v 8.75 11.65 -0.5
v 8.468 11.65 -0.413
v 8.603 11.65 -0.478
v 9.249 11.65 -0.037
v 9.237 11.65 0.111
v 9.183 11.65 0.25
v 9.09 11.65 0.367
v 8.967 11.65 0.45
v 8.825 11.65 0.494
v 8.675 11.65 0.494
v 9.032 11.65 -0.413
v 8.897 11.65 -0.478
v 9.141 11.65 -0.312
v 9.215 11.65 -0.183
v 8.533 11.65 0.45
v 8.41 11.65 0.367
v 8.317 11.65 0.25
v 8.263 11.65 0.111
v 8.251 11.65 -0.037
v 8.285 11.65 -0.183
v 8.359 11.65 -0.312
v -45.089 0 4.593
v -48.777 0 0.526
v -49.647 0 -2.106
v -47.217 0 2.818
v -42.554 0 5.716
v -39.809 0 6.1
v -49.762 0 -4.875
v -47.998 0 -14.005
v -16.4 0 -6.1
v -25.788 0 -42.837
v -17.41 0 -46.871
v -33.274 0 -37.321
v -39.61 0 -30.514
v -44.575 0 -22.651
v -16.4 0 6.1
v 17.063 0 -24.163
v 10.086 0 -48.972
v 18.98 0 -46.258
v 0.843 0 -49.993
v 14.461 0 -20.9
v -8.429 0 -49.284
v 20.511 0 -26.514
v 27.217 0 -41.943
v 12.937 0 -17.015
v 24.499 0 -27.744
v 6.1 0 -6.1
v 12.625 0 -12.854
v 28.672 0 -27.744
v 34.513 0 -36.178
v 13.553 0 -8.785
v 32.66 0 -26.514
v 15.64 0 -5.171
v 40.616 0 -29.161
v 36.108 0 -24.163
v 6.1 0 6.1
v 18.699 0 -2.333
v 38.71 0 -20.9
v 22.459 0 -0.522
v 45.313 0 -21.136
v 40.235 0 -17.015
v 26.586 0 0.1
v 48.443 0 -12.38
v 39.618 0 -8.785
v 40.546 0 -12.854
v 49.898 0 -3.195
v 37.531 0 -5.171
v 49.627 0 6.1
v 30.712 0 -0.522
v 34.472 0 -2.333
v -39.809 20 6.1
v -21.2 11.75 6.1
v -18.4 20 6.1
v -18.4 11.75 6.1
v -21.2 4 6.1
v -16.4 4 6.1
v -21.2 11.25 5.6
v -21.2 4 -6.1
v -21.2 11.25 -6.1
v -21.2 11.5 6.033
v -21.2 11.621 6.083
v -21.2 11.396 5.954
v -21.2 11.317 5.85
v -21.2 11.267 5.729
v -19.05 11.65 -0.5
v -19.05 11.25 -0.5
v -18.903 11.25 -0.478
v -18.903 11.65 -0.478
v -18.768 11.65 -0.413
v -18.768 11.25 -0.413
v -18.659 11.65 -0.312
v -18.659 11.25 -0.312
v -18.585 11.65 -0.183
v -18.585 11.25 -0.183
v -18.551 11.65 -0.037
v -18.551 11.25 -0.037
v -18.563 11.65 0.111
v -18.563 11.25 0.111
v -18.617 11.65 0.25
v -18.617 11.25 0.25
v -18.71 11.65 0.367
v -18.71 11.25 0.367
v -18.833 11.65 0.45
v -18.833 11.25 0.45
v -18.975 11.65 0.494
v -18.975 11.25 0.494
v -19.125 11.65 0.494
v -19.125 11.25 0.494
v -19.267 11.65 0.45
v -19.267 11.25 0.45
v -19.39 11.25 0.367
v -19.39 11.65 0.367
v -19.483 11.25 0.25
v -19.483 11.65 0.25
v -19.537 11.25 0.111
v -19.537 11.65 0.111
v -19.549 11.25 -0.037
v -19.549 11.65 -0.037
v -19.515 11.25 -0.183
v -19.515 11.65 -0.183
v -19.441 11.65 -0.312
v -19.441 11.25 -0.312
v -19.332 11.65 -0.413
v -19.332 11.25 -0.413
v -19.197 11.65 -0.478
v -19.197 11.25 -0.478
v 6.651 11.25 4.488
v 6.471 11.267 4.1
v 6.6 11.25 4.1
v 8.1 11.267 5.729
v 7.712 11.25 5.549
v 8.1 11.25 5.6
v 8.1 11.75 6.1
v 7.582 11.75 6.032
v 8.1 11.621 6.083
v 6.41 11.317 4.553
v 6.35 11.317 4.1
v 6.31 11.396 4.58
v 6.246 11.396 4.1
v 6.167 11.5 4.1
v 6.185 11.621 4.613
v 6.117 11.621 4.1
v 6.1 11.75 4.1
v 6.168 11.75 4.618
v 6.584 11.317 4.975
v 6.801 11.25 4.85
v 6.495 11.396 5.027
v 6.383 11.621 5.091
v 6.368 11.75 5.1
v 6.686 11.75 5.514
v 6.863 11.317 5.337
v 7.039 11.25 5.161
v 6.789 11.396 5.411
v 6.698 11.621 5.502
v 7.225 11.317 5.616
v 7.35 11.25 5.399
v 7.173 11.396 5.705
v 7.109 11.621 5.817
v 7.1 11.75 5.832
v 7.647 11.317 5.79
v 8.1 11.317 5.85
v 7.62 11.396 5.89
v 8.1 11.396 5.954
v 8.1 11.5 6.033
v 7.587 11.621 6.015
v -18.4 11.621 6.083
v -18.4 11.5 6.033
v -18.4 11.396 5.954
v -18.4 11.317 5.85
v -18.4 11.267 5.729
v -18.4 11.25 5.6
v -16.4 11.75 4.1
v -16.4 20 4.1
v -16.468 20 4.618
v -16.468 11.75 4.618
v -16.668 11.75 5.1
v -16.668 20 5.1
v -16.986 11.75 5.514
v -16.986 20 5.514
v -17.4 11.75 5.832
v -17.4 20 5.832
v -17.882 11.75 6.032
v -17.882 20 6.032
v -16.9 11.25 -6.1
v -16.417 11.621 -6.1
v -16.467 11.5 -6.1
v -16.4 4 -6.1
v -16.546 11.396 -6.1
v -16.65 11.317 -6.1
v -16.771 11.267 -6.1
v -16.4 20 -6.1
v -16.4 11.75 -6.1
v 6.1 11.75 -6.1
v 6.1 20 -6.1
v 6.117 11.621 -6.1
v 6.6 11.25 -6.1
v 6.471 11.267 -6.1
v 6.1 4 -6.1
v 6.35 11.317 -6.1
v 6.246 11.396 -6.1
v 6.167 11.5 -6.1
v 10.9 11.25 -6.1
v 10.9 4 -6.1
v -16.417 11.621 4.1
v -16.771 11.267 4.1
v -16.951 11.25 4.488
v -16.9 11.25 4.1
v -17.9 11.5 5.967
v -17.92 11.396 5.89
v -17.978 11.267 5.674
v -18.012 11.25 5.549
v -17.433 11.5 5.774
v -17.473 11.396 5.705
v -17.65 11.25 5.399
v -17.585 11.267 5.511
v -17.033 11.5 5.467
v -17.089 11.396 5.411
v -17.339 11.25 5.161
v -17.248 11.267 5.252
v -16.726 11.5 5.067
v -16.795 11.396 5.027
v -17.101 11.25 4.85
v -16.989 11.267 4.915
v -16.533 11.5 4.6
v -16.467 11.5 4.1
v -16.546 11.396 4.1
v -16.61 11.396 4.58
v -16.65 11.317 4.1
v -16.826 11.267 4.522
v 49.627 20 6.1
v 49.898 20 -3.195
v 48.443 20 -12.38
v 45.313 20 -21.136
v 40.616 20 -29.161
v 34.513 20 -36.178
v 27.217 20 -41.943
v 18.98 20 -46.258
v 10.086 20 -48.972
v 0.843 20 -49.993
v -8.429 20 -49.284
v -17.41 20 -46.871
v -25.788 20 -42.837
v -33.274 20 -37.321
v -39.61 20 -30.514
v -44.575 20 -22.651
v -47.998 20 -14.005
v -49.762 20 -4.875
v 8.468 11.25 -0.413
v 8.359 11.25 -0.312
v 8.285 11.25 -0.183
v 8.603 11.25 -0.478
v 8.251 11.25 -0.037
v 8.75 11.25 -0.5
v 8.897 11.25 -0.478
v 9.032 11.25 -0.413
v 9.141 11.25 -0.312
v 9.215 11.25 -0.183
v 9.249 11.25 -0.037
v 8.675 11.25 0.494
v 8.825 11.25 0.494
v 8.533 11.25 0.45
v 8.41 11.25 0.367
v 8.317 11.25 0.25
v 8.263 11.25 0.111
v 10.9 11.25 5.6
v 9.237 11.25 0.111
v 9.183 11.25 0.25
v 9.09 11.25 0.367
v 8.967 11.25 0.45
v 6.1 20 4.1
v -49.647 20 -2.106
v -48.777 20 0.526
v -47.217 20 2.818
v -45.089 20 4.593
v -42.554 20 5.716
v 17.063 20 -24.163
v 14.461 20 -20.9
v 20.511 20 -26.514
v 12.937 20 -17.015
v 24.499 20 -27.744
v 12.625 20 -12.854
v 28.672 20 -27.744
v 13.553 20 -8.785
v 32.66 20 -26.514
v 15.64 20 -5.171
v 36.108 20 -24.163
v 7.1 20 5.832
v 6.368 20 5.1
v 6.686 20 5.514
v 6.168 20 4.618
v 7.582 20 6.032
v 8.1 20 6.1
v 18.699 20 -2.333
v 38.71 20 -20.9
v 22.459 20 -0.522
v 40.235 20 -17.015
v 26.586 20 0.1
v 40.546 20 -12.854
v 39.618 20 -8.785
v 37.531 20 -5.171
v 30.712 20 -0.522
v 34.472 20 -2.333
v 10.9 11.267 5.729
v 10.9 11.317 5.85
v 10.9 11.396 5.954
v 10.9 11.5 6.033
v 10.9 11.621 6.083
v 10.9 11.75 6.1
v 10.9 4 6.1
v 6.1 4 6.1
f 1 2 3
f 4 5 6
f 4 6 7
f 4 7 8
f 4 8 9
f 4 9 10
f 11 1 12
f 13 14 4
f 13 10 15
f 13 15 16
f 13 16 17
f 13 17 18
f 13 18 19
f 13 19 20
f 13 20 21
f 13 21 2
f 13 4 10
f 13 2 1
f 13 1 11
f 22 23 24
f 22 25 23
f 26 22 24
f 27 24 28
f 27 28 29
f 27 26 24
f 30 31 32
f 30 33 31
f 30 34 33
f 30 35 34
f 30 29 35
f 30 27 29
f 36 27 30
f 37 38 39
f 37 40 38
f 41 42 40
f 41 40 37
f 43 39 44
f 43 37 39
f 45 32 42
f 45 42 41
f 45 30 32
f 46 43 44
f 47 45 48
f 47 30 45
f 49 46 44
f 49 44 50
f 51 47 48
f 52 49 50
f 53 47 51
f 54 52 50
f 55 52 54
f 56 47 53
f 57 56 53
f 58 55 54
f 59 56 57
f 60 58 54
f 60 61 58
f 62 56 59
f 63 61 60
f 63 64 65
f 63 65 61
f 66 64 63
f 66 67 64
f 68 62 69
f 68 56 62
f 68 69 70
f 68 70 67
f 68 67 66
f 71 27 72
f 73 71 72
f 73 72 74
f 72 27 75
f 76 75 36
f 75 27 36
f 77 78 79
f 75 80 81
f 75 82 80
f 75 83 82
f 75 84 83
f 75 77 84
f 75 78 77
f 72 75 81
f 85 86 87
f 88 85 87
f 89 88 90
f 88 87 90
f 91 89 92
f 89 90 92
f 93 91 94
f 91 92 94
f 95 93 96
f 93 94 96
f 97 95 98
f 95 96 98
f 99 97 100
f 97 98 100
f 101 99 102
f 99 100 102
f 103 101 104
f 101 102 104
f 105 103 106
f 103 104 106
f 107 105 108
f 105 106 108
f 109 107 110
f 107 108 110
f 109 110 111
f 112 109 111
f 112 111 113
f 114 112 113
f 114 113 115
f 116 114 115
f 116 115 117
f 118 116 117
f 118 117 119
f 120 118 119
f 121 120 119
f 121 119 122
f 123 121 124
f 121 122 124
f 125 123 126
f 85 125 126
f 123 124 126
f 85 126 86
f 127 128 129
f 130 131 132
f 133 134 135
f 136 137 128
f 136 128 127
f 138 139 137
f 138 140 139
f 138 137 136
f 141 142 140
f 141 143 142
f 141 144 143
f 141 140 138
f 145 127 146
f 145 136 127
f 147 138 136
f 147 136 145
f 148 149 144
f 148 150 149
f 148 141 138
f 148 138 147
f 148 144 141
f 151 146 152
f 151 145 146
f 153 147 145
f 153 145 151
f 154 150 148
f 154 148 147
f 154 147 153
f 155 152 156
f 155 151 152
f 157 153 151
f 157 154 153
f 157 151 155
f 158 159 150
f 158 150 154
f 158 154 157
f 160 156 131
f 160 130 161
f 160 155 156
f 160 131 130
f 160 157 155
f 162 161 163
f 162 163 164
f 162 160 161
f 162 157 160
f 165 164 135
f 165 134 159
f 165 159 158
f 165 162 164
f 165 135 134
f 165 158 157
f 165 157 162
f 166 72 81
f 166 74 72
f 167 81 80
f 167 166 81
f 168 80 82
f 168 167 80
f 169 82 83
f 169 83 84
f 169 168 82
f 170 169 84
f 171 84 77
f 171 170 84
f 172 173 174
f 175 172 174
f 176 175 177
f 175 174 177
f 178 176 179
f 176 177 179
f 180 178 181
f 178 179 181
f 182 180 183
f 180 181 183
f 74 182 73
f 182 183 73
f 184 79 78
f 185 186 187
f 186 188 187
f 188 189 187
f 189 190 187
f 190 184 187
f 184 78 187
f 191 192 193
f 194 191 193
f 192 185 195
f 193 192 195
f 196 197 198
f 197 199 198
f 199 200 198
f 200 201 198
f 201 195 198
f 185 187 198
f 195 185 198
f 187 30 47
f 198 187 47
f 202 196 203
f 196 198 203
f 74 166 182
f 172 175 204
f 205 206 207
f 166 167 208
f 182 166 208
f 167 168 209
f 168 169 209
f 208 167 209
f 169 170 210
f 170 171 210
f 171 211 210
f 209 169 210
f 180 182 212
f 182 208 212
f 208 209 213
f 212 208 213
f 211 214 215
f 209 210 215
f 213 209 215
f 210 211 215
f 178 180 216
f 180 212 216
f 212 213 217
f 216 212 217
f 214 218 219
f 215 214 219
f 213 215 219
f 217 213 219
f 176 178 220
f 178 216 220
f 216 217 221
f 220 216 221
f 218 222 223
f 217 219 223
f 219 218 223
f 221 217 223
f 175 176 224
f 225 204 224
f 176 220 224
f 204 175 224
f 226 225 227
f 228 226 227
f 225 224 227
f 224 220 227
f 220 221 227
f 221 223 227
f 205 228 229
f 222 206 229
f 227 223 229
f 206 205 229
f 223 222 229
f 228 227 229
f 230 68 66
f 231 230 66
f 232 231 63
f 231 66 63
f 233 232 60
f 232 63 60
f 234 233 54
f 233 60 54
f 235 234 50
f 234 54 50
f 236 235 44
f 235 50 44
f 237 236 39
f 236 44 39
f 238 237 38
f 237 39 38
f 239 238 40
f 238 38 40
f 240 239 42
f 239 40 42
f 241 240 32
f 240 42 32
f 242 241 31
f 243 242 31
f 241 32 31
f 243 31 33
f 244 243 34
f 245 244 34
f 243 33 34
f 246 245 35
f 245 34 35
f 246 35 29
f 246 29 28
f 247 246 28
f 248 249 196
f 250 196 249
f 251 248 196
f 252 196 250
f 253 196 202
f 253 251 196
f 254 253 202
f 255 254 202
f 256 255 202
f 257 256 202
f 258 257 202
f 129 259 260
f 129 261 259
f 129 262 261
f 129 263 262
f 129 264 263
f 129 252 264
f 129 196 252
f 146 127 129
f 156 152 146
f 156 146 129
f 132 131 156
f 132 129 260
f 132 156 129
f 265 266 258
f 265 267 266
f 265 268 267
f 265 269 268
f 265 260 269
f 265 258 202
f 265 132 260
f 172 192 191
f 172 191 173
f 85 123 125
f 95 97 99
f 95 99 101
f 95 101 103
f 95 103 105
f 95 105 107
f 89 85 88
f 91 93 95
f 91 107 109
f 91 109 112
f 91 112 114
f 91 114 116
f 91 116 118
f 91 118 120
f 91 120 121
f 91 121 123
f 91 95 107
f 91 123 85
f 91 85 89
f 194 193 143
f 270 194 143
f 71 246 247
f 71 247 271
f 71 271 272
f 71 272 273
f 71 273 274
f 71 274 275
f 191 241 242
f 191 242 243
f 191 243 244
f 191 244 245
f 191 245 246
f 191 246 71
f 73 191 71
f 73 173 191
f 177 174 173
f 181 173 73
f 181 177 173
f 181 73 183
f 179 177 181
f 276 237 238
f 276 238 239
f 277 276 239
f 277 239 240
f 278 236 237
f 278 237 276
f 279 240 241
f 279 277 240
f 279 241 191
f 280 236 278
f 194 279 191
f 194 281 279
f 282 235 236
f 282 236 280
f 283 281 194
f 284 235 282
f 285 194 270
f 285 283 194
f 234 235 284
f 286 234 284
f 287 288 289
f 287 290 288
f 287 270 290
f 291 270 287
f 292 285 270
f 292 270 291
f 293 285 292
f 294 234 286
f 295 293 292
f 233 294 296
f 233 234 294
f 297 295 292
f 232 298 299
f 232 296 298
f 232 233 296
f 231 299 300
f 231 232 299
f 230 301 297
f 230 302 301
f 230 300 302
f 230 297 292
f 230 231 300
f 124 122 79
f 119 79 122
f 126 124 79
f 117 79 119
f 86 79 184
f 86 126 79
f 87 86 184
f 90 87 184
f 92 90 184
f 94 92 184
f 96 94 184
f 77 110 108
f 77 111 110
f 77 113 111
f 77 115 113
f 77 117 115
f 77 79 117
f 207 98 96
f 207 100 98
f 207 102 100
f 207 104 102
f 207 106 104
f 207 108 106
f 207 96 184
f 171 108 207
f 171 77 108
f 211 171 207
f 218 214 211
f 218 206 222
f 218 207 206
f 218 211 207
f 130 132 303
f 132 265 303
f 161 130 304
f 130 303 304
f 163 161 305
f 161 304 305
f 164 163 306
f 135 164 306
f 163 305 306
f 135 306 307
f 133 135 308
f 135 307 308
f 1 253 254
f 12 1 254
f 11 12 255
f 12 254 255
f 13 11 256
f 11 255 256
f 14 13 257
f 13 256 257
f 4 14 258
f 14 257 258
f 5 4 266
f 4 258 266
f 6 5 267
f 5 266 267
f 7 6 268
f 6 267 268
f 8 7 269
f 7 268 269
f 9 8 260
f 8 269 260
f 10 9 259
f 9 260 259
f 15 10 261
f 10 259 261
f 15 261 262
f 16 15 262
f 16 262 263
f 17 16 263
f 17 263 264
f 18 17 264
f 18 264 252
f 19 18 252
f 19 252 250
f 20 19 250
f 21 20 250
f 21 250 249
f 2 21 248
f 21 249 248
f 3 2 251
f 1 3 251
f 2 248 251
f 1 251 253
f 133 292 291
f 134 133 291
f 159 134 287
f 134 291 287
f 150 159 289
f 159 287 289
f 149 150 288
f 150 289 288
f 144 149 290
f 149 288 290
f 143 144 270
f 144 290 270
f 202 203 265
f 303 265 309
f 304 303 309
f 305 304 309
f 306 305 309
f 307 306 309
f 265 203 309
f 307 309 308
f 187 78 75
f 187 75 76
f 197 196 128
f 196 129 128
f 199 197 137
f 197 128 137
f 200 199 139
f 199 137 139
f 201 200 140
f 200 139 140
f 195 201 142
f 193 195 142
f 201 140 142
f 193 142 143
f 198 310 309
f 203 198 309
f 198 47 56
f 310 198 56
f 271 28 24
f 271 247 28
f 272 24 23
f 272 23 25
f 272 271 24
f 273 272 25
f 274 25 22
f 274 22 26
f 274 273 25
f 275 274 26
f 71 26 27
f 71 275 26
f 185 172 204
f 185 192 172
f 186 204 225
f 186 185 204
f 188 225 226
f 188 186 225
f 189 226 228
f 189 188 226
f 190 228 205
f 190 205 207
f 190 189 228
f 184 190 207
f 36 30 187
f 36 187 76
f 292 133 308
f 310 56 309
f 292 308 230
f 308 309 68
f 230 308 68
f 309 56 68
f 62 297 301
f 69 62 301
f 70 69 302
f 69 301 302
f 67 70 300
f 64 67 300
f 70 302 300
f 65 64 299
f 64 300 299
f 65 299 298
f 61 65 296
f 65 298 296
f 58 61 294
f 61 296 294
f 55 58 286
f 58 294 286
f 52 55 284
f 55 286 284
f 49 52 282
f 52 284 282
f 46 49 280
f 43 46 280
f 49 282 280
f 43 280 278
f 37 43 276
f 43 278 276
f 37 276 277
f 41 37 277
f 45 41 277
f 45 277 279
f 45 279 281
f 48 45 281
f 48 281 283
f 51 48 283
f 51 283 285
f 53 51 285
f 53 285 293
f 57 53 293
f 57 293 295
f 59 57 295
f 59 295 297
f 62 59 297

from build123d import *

# Parameters (mm, degrees)
SKETCH1_R           = 50
BOSS_EXTRUDE1_DEPTH = 20
CUT_EXTRUDE3_DEPTH  = 74.484692283
SKETCH14_W          = 22.5
SKETCH14_H          = 12.2
CUT_EXTRUDE4_DEPTH  = 74.484692283
SKETCH16_W          = 4.8
SKETCH16_H          = 12.2
CUT_EXTRUDE5_DEPTH  = 11.25
CUT_EXTRUDE7_START  = -11.25
SKETCH17_R          = 0.5
CUT_EXTRUDE7_DEPTH  = 0.4
CUT_EXTRUDE8_DEPTH  = 74.484692283
FILLET1_R           = 2
FILLET2_R           = 0.5
SKETCH4_R           = 14
CUT_EXTRUDE2_DEPTH  = 74.484692283
SKETCH20_W          = 4.8
SKETCH20_H          = 12.2
BOSS_EXTRUDE2_DEPTH = 4
FILLET3_R           = 10


with BuildPart() as part:
    # Sketch1 → Boss-Extrude1 (new body)
    with BuildSketch(Plane(origin=(0, 0, 0), x_dir=(1, 0, 0), z_dir=(0, 1, 0))):
        with Locations(Location((0, 0, 0), (0, 0, 270))):
            Circle(SKETCH1_R)
    extrude(amount=BOSS_EXTRUDE1_DEPTH)

    # Sketch15 → Cut-Extrude3 (cut, through all)
    with BuildSketch(Plane.XZ):
        with BuildLine():
            Line((-21.2, 6.1), (-21.2, 45.283109434))
            ThreePointArc((-21.2, 45.283109434), (-5.873377692, 49.65383605), (10.05, 48.979562064))
            Line((10.05, 48.979562064), (10.9, 6.1))
            Line((10.9, 6.1), (-21.2, 6.1))
        make_face()
    extrude(amount=-CUT_EXTRUDE3_DEPTH, mode=Mode.SUBTRACT)

    # Sketch14 → Cut-Extrude4 (cut, through all)
    with BuildSketch(Plane.XZ):
        with Locations((-5.15, 0)):
            Rectangle(SKETCH14_W, SKETCH14_H)
    extrude(amount=-CUT_EXTRUDE4_DEPTH, mode=Mode.SUBTRACT)

    # Sketch16 → Cut-Extrude5 (cut)
    with BuildSketch(Plane.XZ):
        with Locations((-18.8, 0)):
            Rectangle(SKETCH16_W, SKETCH16_H)
        with Locations((8.5, 0)):
            Rectangle(SKETCH16_W, SKETCH16_H)
    extrude(amount=-CUT_EXTRUDE5_DEPTH, mode=Mode.SUBTRACT)

    # Sketch17 → Cut-Extrude7 (cut)
    with BuildSketch(Plane.XZ.offset(CUT_EXTRUDE7_START)):
        with Locations(Location((8.75, 0, 0), (0, 0, 270))):
            Circle(SKETCH17_R)
        with Locations(Location((-19.05, 0, 0), (0, 0, 270))):
            Circle(SKETCH17_R)
    extrude(amount=-CUT_EXTRUDE7_DEPTH, mode=Mode.SUBTRACT)

    # Sketch18 → Cut-Extrude8 (cut, through all)
    with BuildSketch(Plane(origin=(0, 0, 0), x_dir=(-1, 0, 0), z_dir=(0, -1, 0))):
        with BuildLine():
            Line((-10.9, -6.1), (-49.626505015, -6.1))
            ThreePointArc((-49.626505015, -6.1), (0, -50), (49.626505015, -6.1))
            Line((49.626505015, -6.1), (-10.9, -6.1))
        make_face()
    extrude(amount=-CUT_EXTRUDE8_DEPTH, mode=Mode.SUBTRACT)

    # Fillet1
    fillet1_edges = [part.edges().sort_by_distance(p)[0] for p in [
        (-16.4, 15.625, 6.1),
        (6.1, 15.625, 6.1),
    ]]
    fillet(fillet1_edges, radius=FILLET1_R)

    # Fillet2
    fillet2_edges = [part.edges().sort_by_distance(p)[0] for p in [
        (-19.8, 11.25, 6.1),
        (-16.985786438, 11.25, 5.514213562),
        (6.1, 11.25, -1),
        (6.685786438, 11.25, 5.514213562),
        (-16.4, 11.25, -1),
        (9.5, 11.25, 6.1),
    ]]
    fillet(fillet2_edges, radius=FILLET2_R)

    # Sketch4 → Cut-Extrude2 (cut, through all)
    with BuildSketch(Plane(origin=(0, 20, 0), x_dir=(1, 0, 0), z_dir=(0, 1, 0))):
        with Locations(Location((26.585522376, 13.9, 0), (0, 0, 270))):
            Circle(SKETCH4_R)
    extrude(amount=-CUT_EXTRUDE2_DEPTH, mode=Mode.SUBTRACT)

    # Sketch20 → Boss-Extrude2 (add)
    with BuildSketch(Plane.XZ):
        with Locations((-18.8, 0)):
            Rectangle(SKETCH20_W, SKETCH20_H)
        with Locations((8.5, 0)):
            Rectangle(SKETCH20_W, SKETCH20_H)
    extrude(amount=-BOSS_EXTRUDE2_DEPTH)

    # Fillet3
    fillet3_edges = [part.edges().sort_by_distance(p)[0] for p in [
        (-49.626505015, 10, 6.1),
    ]]
    fillet(fillet3_edges, radius=FILLET3_R)


solid = part.part
